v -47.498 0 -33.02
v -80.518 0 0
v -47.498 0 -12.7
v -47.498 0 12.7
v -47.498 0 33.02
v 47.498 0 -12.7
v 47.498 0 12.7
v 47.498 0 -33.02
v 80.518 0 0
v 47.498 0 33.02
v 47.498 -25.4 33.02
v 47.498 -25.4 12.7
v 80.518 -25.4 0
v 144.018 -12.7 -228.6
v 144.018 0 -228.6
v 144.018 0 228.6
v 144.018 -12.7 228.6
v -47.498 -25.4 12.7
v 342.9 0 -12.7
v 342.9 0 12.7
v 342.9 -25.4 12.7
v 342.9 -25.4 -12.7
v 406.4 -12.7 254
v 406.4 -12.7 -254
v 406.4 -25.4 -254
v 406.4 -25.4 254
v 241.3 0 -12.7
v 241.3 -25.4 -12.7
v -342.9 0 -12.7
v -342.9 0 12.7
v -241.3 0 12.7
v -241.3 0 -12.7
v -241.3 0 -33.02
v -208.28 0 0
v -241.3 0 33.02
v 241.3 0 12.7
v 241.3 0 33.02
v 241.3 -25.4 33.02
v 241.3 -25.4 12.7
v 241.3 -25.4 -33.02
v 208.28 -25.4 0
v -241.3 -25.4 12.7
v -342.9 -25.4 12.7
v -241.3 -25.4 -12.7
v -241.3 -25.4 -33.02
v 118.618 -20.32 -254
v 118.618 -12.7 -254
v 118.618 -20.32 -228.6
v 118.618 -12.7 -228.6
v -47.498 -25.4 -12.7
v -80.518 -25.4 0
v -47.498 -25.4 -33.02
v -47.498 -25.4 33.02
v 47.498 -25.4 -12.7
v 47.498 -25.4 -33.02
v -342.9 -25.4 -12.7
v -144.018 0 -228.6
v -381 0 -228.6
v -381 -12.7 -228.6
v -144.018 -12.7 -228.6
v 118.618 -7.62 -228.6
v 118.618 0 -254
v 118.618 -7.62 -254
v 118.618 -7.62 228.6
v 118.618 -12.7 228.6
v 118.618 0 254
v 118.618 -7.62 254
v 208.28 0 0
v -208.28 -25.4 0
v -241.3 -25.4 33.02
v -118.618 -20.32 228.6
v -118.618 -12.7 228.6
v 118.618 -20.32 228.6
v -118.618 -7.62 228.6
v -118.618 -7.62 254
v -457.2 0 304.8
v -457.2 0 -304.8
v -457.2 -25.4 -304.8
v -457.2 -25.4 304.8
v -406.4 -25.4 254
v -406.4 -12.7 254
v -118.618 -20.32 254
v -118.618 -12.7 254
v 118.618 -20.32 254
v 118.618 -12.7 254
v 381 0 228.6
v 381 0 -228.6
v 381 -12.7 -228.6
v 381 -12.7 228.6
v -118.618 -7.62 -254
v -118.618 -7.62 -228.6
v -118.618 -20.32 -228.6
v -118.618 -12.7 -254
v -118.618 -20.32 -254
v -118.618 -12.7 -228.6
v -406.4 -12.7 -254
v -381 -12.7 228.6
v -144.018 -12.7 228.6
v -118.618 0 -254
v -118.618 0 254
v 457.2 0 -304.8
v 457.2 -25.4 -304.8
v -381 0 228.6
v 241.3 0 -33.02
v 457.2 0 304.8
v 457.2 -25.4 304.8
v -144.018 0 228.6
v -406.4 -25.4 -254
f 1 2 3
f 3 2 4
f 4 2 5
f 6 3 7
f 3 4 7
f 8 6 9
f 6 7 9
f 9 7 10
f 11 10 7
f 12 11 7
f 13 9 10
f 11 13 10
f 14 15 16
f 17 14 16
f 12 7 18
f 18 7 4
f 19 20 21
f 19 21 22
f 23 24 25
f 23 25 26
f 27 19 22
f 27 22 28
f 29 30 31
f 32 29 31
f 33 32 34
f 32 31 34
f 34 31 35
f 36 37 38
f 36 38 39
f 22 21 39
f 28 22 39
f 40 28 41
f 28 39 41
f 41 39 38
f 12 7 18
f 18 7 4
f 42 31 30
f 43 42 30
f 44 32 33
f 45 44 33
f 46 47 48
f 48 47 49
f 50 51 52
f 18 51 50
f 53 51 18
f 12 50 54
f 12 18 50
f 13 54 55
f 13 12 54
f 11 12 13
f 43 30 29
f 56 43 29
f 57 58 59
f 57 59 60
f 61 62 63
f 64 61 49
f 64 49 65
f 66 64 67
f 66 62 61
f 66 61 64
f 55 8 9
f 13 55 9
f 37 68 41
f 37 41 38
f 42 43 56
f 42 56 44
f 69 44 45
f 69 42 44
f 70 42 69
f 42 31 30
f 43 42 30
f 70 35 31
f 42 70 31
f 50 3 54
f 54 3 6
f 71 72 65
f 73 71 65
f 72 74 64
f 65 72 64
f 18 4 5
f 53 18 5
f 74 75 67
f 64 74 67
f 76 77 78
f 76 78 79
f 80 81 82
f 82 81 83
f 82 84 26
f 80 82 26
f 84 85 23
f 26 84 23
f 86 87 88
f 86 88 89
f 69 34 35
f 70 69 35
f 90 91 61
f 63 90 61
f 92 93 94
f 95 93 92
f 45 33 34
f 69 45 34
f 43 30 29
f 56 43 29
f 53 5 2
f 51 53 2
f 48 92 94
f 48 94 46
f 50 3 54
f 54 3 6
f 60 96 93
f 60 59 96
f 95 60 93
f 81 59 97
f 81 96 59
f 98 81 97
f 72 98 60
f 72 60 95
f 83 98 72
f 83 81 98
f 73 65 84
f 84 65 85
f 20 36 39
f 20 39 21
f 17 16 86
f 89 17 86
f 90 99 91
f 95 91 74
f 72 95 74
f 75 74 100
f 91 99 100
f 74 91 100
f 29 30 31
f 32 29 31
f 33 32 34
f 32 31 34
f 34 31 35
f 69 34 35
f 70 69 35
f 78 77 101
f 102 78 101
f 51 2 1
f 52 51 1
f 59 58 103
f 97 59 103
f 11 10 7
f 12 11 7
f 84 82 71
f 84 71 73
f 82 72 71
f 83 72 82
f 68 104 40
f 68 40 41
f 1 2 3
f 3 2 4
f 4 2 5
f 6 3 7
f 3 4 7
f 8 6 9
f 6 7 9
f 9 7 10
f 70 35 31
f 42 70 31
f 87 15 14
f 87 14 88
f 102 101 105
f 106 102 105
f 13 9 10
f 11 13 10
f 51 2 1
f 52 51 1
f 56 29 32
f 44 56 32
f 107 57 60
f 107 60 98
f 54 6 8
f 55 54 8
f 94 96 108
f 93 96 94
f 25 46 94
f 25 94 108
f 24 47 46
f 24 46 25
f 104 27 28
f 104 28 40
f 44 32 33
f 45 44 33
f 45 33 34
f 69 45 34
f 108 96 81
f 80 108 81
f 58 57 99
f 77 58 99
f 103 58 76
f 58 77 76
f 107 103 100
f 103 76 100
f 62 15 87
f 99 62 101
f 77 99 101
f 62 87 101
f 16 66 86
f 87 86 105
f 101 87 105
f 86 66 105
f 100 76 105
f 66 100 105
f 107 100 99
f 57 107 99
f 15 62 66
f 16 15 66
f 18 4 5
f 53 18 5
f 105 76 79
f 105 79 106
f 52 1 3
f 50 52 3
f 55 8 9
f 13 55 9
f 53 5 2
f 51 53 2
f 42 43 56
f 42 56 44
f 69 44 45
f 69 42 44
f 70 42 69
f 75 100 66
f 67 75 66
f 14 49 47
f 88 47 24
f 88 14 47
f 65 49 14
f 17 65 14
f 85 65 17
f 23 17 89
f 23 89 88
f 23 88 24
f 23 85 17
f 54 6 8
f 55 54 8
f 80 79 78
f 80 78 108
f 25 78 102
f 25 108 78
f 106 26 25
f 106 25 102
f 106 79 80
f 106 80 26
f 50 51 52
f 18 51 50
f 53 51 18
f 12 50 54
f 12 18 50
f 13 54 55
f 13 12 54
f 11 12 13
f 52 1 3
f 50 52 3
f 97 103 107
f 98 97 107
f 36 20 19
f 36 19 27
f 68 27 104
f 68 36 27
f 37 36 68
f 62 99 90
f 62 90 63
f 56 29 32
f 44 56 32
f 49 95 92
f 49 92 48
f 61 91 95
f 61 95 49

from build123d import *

# Parameters (mm, degrees)
F0_W      = 914.4
F0_H      = 609.6
F0_W_2    = 812.8
F0_H_2    = 508
F1_DEPTH  = 25.4
F2_W      = 287.782
F2_H      = 508
F2_W_2    = 236.982
F2_H_2    = 457.2
F3_DEPTH  = 12.7
F5_DEPTH  = 25.4
F7_DEPTH  = 25.4
F9_W      = 237.236
F9_H      = 25.4
F10_DEPTH = 12.7


with BuildPart() as f1:
    # F0 (on Front) → F1 (new body)
    with BuildSketch(Plane.XZ):
        Rectangle(F0_W, F0_H)
        Rectangle(F0_W_2, F0_H_2, mode=Mode.SUBTRACT)
    extrude(amount=F1_DEPTH)

    # F2 (on Front) → F3 (join)
    with BuildSketch(Plane.XZ):
        with Locations((-262.509, 0)):
            Rectangle(F2_W, F2_H)
        with Locations((-262.509, 0)):
            Rectangle(F2_W_2, F2_H_2, mode=Mode.SUBTRACT)
        with Locations((262.509, 0)):
            Rectangle(F2_W, F2_H)
        with Locations((262.509, 0)):
            Rectangle(F2_W_2, F2_H_2, mode=Mode.SUBTRACT)
    extrude(amount=F3_DEPTH)

    # F9 (on offset) → F10 (join)
    with BuildSketch(Plane.XZ.offset(7.62)):
        with Locations((0, 241.3)):
            Rectangle(F9_W, F9_H)
        with Locations((0, -241.3)):
            Rectangle(F9_W, F9_H)
    extrude(amount=F10_DEPTH)


with BuildPart() as f5:
    # F4 (on Front) → F5 (new body)
    with BuildSketch(Plane.XZ):
        Polygon((-241.3, -33.02), (-208.28, 0), (-241.3, 33.02), (-241.3, 12.7), (-342.9, 12.7), (-342.9, -12.7), (-241.3, -12.7), align=None)
    extrude(amount=F5_DEPTH)


with BuildPart() as f5b:
    # F4 (on Front) → F5, piece 2 (new body)
    with BuildSketch(Plane.XZ):
        Polygon((0, 12.7), (-47.498, 12.7), (-47.498, 33.02), (-80.518, 0), (-47.498, -33.02), (-47.498, -12.7), (0, -12.7), (47.498, -12.7), (47.498, -33.02), (80.518, 0), (47.498, 33.02), (47.498, 12.7), align=None)
    extrude(amount=F5_DEPTH)


with BuildPart() as f6_1:
    # F6: instance of F5
    add(f5.part.mirror(Plane.YZ))


with BuildPart() as f7:
    # F4 (on Front) → F7 (new body)
    with BuildSketch(Plane.XZ):
        Polygon((-241.3, -33.02), (-208.28, 0), (-241.3, 33.02), (-241.3, 12.7), (-342.9, 12.7), (-342.9, -12.7), (-241.3, -12.7), align=None)
    extrude(amount=F7_DEPTH)


with BuildPart() as f7b:
    # F4 (on Front) → F7, piece 2 (new body)
    with BuildSketch(Plane.XZ):
        Polygon((0, 12.7), (-47.498, 12.7), (-47.498, 33.02), (-80.518, 0), (-47.498, -33.02), (-47.498, -12.7), (0, -12.7), (47.498, -12.7), (47.498, -33.02), (80.518, 0), (47.498, 33.02), (47.498, 12.7), align=None)
    extrude(amount=F7_DEPTH)


solid = Compound([f1.part, f5.part, f5b.part, f6_1.part, f7.part, f7b.part])
